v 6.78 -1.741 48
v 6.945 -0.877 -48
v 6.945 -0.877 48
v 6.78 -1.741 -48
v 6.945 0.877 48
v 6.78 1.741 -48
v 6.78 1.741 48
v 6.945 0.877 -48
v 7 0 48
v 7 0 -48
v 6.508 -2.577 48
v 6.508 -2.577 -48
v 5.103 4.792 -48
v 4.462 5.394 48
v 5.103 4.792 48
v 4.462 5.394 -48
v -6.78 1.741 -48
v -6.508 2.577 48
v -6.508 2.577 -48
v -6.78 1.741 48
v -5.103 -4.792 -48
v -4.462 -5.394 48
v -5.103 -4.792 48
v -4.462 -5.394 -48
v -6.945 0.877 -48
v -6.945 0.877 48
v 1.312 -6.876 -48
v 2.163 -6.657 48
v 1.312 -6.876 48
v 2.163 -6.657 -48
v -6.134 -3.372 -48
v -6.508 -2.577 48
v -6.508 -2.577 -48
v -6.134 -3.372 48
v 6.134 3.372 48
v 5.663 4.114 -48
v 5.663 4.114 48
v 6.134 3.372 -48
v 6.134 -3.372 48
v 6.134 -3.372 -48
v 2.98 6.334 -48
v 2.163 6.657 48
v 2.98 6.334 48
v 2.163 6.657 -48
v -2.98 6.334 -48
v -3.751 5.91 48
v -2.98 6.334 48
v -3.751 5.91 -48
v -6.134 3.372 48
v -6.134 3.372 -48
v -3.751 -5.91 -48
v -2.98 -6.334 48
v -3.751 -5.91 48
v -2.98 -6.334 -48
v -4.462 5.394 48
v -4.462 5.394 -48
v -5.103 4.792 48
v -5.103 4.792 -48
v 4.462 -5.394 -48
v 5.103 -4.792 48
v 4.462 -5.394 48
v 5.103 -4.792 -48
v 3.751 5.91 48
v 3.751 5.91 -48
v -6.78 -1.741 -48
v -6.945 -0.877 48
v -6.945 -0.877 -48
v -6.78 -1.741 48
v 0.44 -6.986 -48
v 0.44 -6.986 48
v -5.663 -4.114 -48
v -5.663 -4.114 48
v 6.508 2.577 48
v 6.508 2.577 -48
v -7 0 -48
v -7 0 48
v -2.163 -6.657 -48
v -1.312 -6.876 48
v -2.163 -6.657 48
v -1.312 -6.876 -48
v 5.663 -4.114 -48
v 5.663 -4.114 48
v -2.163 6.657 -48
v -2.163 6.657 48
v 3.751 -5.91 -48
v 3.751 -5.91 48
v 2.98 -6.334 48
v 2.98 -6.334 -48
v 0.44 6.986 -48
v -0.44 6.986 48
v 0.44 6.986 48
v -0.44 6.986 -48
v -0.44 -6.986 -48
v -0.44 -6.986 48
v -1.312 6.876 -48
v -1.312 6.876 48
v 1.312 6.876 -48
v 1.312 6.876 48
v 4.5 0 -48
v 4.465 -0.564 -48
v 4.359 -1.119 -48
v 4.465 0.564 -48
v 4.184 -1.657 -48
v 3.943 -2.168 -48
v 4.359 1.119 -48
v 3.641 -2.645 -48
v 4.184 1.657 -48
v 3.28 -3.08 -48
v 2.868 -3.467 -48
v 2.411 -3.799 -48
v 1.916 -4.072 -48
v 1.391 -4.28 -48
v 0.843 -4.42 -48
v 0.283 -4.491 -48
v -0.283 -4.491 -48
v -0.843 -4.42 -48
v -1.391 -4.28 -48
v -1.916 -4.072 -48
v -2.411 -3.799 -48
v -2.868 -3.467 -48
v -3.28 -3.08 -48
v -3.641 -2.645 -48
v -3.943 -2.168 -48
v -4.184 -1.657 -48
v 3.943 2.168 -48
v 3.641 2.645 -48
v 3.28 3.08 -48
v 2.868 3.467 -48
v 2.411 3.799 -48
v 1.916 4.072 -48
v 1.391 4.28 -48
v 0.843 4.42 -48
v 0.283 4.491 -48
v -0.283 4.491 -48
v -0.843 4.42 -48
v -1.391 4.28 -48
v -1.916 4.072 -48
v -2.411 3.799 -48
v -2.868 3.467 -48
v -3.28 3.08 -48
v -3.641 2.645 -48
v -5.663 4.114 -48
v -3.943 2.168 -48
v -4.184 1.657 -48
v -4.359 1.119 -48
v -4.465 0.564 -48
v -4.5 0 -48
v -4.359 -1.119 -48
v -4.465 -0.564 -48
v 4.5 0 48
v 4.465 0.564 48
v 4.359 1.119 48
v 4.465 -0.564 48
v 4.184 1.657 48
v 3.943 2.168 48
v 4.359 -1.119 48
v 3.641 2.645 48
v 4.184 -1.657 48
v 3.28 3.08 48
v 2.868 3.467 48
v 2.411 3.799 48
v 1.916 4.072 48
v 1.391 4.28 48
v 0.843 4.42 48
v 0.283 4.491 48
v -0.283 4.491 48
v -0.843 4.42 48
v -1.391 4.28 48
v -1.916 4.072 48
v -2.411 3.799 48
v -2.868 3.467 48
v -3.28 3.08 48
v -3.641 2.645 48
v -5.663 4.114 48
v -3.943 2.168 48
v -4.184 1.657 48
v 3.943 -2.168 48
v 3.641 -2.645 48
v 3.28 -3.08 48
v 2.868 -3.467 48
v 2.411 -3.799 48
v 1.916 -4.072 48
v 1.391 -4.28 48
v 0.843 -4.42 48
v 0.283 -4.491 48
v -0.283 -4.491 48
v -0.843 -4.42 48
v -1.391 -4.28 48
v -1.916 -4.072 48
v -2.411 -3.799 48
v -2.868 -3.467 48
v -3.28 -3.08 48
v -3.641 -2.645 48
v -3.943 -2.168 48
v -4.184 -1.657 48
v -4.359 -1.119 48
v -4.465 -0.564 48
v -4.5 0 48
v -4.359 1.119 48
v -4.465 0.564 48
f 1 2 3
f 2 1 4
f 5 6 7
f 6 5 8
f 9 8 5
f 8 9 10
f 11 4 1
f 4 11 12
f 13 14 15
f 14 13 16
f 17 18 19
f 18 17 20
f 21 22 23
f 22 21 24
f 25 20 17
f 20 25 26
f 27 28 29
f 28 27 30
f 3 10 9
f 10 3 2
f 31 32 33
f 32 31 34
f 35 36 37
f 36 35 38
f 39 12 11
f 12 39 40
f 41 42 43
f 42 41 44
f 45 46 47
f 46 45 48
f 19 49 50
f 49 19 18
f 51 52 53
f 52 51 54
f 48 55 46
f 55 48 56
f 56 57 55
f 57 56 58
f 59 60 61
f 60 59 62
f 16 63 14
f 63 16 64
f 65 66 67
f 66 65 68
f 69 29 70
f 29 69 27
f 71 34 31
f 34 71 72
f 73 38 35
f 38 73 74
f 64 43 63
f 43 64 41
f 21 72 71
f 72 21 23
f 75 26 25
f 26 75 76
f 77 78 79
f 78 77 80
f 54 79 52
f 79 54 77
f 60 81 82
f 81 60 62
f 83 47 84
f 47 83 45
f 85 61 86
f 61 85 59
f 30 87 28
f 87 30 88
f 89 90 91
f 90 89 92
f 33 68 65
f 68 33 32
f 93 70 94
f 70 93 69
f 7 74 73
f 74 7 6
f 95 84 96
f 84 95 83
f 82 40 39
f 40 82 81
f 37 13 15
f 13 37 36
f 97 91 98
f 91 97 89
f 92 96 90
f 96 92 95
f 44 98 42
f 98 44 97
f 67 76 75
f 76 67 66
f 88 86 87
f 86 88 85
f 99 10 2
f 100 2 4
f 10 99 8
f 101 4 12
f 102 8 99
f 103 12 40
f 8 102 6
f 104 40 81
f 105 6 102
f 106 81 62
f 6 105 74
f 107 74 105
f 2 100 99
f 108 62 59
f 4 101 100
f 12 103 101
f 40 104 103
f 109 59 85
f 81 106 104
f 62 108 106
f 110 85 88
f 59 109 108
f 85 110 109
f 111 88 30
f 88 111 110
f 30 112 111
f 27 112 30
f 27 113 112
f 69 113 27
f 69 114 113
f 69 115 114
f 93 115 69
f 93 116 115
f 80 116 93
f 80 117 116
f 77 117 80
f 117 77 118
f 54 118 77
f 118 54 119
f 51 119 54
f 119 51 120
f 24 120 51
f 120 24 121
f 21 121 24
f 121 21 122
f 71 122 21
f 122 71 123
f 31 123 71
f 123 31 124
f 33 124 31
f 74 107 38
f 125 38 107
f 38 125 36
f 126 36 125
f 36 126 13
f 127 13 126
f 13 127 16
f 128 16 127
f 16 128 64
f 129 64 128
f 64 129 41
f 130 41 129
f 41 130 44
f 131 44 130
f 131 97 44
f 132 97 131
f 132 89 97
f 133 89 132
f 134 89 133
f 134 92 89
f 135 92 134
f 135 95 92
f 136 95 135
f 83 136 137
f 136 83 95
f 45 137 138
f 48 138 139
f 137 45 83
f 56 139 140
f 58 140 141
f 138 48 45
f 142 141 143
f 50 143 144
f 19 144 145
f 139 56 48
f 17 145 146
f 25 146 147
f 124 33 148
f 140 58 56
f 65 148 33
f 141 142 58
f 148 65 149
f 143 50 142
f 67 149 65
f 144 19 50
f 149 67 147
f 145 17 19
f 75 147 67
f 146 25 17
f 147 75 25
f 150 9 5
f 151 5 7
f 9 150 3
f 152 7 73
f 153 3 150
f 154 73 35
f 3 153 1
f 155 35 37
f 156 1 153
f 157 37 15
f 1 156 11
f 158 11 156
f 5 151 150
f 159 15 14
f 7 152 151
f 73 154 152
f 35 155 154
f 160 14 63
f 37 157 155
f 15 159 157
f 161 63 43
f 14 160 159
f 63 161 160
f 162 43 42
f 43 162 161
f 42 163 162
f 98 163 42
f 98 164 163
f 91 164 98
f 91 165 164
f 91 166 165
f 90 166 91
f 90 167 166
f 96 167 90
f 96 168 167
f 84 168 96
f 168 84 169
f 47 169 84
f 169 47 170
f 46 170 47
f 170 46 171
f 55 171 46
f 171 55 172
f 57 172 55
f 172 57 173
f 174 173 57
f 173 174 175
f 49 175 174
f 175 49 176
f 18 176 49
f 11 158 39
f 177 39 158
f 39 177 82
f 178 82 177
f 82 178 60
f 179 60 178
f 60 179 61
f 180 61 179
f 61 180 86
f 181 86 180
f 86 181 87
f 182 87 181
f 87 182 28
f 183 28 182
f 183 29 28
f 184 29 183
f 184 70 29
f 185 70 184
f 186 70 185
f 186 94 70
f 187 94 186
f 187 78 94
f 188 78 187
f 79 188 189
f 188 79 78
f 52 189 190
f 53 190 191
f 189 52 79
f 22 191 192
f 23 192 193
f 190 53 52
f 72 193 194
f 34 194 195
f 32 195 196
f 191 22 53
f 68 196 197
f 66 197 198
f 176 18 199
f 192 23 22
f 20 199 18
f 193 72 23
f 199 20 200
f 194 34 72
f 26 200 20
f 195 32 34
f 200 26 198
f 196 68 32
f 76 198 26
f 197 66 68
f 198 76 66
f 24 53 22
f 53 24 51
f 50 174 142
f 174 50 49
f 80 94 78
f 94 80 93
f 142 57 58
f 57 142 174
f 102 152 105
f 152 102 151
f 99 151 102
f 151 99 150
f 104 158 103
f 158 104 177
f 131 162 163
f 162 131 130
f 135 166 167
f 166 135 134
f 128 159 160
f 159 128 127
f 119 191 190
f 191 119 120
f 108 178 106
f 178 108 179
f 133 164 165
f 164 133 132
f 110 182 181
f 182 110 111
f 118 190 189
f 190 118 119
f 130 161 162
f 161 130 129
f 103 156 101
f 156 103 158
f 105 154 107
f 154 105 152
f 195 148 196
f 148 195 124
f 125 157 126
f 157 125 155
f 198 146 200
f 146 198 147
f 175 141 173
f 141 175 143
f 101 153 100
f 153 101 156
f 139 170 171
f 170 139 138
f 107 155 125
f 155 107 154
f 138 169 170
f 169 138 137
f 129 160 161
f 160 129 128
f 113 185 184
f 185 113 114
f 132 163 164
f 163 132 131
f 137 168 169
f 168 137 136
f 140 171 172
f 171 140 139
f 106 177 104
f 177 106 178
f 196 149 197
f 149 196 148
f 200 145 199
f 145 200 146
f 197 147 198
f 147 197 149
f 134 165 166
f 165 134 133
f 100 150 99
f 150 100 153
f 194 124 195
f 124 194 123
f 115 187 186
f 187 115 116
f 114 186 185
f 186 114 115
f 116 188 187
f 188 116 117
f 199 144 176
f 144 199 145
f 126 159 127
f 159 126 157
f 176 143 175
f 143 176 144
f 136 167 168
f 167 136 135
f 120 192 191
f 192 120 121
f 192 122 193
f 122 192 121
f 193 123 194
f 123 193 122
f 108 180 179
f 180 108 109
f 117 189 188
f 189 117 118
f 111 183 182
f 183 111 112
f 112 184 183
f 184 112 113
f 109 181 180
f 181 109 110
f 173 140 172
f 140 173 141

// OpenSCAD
$fn = 50;


difference() {
	union() {
		translate(v = [0, 0, -48.0000000000]) {
			cylinder(h = 96, r = 7.0000000000);
		}
	}
	union() {
		translate(v = [0, 0, -100.0000000000]) {
			cylinder(h = 200, r = 4.5000000000);
		}
	}
}
